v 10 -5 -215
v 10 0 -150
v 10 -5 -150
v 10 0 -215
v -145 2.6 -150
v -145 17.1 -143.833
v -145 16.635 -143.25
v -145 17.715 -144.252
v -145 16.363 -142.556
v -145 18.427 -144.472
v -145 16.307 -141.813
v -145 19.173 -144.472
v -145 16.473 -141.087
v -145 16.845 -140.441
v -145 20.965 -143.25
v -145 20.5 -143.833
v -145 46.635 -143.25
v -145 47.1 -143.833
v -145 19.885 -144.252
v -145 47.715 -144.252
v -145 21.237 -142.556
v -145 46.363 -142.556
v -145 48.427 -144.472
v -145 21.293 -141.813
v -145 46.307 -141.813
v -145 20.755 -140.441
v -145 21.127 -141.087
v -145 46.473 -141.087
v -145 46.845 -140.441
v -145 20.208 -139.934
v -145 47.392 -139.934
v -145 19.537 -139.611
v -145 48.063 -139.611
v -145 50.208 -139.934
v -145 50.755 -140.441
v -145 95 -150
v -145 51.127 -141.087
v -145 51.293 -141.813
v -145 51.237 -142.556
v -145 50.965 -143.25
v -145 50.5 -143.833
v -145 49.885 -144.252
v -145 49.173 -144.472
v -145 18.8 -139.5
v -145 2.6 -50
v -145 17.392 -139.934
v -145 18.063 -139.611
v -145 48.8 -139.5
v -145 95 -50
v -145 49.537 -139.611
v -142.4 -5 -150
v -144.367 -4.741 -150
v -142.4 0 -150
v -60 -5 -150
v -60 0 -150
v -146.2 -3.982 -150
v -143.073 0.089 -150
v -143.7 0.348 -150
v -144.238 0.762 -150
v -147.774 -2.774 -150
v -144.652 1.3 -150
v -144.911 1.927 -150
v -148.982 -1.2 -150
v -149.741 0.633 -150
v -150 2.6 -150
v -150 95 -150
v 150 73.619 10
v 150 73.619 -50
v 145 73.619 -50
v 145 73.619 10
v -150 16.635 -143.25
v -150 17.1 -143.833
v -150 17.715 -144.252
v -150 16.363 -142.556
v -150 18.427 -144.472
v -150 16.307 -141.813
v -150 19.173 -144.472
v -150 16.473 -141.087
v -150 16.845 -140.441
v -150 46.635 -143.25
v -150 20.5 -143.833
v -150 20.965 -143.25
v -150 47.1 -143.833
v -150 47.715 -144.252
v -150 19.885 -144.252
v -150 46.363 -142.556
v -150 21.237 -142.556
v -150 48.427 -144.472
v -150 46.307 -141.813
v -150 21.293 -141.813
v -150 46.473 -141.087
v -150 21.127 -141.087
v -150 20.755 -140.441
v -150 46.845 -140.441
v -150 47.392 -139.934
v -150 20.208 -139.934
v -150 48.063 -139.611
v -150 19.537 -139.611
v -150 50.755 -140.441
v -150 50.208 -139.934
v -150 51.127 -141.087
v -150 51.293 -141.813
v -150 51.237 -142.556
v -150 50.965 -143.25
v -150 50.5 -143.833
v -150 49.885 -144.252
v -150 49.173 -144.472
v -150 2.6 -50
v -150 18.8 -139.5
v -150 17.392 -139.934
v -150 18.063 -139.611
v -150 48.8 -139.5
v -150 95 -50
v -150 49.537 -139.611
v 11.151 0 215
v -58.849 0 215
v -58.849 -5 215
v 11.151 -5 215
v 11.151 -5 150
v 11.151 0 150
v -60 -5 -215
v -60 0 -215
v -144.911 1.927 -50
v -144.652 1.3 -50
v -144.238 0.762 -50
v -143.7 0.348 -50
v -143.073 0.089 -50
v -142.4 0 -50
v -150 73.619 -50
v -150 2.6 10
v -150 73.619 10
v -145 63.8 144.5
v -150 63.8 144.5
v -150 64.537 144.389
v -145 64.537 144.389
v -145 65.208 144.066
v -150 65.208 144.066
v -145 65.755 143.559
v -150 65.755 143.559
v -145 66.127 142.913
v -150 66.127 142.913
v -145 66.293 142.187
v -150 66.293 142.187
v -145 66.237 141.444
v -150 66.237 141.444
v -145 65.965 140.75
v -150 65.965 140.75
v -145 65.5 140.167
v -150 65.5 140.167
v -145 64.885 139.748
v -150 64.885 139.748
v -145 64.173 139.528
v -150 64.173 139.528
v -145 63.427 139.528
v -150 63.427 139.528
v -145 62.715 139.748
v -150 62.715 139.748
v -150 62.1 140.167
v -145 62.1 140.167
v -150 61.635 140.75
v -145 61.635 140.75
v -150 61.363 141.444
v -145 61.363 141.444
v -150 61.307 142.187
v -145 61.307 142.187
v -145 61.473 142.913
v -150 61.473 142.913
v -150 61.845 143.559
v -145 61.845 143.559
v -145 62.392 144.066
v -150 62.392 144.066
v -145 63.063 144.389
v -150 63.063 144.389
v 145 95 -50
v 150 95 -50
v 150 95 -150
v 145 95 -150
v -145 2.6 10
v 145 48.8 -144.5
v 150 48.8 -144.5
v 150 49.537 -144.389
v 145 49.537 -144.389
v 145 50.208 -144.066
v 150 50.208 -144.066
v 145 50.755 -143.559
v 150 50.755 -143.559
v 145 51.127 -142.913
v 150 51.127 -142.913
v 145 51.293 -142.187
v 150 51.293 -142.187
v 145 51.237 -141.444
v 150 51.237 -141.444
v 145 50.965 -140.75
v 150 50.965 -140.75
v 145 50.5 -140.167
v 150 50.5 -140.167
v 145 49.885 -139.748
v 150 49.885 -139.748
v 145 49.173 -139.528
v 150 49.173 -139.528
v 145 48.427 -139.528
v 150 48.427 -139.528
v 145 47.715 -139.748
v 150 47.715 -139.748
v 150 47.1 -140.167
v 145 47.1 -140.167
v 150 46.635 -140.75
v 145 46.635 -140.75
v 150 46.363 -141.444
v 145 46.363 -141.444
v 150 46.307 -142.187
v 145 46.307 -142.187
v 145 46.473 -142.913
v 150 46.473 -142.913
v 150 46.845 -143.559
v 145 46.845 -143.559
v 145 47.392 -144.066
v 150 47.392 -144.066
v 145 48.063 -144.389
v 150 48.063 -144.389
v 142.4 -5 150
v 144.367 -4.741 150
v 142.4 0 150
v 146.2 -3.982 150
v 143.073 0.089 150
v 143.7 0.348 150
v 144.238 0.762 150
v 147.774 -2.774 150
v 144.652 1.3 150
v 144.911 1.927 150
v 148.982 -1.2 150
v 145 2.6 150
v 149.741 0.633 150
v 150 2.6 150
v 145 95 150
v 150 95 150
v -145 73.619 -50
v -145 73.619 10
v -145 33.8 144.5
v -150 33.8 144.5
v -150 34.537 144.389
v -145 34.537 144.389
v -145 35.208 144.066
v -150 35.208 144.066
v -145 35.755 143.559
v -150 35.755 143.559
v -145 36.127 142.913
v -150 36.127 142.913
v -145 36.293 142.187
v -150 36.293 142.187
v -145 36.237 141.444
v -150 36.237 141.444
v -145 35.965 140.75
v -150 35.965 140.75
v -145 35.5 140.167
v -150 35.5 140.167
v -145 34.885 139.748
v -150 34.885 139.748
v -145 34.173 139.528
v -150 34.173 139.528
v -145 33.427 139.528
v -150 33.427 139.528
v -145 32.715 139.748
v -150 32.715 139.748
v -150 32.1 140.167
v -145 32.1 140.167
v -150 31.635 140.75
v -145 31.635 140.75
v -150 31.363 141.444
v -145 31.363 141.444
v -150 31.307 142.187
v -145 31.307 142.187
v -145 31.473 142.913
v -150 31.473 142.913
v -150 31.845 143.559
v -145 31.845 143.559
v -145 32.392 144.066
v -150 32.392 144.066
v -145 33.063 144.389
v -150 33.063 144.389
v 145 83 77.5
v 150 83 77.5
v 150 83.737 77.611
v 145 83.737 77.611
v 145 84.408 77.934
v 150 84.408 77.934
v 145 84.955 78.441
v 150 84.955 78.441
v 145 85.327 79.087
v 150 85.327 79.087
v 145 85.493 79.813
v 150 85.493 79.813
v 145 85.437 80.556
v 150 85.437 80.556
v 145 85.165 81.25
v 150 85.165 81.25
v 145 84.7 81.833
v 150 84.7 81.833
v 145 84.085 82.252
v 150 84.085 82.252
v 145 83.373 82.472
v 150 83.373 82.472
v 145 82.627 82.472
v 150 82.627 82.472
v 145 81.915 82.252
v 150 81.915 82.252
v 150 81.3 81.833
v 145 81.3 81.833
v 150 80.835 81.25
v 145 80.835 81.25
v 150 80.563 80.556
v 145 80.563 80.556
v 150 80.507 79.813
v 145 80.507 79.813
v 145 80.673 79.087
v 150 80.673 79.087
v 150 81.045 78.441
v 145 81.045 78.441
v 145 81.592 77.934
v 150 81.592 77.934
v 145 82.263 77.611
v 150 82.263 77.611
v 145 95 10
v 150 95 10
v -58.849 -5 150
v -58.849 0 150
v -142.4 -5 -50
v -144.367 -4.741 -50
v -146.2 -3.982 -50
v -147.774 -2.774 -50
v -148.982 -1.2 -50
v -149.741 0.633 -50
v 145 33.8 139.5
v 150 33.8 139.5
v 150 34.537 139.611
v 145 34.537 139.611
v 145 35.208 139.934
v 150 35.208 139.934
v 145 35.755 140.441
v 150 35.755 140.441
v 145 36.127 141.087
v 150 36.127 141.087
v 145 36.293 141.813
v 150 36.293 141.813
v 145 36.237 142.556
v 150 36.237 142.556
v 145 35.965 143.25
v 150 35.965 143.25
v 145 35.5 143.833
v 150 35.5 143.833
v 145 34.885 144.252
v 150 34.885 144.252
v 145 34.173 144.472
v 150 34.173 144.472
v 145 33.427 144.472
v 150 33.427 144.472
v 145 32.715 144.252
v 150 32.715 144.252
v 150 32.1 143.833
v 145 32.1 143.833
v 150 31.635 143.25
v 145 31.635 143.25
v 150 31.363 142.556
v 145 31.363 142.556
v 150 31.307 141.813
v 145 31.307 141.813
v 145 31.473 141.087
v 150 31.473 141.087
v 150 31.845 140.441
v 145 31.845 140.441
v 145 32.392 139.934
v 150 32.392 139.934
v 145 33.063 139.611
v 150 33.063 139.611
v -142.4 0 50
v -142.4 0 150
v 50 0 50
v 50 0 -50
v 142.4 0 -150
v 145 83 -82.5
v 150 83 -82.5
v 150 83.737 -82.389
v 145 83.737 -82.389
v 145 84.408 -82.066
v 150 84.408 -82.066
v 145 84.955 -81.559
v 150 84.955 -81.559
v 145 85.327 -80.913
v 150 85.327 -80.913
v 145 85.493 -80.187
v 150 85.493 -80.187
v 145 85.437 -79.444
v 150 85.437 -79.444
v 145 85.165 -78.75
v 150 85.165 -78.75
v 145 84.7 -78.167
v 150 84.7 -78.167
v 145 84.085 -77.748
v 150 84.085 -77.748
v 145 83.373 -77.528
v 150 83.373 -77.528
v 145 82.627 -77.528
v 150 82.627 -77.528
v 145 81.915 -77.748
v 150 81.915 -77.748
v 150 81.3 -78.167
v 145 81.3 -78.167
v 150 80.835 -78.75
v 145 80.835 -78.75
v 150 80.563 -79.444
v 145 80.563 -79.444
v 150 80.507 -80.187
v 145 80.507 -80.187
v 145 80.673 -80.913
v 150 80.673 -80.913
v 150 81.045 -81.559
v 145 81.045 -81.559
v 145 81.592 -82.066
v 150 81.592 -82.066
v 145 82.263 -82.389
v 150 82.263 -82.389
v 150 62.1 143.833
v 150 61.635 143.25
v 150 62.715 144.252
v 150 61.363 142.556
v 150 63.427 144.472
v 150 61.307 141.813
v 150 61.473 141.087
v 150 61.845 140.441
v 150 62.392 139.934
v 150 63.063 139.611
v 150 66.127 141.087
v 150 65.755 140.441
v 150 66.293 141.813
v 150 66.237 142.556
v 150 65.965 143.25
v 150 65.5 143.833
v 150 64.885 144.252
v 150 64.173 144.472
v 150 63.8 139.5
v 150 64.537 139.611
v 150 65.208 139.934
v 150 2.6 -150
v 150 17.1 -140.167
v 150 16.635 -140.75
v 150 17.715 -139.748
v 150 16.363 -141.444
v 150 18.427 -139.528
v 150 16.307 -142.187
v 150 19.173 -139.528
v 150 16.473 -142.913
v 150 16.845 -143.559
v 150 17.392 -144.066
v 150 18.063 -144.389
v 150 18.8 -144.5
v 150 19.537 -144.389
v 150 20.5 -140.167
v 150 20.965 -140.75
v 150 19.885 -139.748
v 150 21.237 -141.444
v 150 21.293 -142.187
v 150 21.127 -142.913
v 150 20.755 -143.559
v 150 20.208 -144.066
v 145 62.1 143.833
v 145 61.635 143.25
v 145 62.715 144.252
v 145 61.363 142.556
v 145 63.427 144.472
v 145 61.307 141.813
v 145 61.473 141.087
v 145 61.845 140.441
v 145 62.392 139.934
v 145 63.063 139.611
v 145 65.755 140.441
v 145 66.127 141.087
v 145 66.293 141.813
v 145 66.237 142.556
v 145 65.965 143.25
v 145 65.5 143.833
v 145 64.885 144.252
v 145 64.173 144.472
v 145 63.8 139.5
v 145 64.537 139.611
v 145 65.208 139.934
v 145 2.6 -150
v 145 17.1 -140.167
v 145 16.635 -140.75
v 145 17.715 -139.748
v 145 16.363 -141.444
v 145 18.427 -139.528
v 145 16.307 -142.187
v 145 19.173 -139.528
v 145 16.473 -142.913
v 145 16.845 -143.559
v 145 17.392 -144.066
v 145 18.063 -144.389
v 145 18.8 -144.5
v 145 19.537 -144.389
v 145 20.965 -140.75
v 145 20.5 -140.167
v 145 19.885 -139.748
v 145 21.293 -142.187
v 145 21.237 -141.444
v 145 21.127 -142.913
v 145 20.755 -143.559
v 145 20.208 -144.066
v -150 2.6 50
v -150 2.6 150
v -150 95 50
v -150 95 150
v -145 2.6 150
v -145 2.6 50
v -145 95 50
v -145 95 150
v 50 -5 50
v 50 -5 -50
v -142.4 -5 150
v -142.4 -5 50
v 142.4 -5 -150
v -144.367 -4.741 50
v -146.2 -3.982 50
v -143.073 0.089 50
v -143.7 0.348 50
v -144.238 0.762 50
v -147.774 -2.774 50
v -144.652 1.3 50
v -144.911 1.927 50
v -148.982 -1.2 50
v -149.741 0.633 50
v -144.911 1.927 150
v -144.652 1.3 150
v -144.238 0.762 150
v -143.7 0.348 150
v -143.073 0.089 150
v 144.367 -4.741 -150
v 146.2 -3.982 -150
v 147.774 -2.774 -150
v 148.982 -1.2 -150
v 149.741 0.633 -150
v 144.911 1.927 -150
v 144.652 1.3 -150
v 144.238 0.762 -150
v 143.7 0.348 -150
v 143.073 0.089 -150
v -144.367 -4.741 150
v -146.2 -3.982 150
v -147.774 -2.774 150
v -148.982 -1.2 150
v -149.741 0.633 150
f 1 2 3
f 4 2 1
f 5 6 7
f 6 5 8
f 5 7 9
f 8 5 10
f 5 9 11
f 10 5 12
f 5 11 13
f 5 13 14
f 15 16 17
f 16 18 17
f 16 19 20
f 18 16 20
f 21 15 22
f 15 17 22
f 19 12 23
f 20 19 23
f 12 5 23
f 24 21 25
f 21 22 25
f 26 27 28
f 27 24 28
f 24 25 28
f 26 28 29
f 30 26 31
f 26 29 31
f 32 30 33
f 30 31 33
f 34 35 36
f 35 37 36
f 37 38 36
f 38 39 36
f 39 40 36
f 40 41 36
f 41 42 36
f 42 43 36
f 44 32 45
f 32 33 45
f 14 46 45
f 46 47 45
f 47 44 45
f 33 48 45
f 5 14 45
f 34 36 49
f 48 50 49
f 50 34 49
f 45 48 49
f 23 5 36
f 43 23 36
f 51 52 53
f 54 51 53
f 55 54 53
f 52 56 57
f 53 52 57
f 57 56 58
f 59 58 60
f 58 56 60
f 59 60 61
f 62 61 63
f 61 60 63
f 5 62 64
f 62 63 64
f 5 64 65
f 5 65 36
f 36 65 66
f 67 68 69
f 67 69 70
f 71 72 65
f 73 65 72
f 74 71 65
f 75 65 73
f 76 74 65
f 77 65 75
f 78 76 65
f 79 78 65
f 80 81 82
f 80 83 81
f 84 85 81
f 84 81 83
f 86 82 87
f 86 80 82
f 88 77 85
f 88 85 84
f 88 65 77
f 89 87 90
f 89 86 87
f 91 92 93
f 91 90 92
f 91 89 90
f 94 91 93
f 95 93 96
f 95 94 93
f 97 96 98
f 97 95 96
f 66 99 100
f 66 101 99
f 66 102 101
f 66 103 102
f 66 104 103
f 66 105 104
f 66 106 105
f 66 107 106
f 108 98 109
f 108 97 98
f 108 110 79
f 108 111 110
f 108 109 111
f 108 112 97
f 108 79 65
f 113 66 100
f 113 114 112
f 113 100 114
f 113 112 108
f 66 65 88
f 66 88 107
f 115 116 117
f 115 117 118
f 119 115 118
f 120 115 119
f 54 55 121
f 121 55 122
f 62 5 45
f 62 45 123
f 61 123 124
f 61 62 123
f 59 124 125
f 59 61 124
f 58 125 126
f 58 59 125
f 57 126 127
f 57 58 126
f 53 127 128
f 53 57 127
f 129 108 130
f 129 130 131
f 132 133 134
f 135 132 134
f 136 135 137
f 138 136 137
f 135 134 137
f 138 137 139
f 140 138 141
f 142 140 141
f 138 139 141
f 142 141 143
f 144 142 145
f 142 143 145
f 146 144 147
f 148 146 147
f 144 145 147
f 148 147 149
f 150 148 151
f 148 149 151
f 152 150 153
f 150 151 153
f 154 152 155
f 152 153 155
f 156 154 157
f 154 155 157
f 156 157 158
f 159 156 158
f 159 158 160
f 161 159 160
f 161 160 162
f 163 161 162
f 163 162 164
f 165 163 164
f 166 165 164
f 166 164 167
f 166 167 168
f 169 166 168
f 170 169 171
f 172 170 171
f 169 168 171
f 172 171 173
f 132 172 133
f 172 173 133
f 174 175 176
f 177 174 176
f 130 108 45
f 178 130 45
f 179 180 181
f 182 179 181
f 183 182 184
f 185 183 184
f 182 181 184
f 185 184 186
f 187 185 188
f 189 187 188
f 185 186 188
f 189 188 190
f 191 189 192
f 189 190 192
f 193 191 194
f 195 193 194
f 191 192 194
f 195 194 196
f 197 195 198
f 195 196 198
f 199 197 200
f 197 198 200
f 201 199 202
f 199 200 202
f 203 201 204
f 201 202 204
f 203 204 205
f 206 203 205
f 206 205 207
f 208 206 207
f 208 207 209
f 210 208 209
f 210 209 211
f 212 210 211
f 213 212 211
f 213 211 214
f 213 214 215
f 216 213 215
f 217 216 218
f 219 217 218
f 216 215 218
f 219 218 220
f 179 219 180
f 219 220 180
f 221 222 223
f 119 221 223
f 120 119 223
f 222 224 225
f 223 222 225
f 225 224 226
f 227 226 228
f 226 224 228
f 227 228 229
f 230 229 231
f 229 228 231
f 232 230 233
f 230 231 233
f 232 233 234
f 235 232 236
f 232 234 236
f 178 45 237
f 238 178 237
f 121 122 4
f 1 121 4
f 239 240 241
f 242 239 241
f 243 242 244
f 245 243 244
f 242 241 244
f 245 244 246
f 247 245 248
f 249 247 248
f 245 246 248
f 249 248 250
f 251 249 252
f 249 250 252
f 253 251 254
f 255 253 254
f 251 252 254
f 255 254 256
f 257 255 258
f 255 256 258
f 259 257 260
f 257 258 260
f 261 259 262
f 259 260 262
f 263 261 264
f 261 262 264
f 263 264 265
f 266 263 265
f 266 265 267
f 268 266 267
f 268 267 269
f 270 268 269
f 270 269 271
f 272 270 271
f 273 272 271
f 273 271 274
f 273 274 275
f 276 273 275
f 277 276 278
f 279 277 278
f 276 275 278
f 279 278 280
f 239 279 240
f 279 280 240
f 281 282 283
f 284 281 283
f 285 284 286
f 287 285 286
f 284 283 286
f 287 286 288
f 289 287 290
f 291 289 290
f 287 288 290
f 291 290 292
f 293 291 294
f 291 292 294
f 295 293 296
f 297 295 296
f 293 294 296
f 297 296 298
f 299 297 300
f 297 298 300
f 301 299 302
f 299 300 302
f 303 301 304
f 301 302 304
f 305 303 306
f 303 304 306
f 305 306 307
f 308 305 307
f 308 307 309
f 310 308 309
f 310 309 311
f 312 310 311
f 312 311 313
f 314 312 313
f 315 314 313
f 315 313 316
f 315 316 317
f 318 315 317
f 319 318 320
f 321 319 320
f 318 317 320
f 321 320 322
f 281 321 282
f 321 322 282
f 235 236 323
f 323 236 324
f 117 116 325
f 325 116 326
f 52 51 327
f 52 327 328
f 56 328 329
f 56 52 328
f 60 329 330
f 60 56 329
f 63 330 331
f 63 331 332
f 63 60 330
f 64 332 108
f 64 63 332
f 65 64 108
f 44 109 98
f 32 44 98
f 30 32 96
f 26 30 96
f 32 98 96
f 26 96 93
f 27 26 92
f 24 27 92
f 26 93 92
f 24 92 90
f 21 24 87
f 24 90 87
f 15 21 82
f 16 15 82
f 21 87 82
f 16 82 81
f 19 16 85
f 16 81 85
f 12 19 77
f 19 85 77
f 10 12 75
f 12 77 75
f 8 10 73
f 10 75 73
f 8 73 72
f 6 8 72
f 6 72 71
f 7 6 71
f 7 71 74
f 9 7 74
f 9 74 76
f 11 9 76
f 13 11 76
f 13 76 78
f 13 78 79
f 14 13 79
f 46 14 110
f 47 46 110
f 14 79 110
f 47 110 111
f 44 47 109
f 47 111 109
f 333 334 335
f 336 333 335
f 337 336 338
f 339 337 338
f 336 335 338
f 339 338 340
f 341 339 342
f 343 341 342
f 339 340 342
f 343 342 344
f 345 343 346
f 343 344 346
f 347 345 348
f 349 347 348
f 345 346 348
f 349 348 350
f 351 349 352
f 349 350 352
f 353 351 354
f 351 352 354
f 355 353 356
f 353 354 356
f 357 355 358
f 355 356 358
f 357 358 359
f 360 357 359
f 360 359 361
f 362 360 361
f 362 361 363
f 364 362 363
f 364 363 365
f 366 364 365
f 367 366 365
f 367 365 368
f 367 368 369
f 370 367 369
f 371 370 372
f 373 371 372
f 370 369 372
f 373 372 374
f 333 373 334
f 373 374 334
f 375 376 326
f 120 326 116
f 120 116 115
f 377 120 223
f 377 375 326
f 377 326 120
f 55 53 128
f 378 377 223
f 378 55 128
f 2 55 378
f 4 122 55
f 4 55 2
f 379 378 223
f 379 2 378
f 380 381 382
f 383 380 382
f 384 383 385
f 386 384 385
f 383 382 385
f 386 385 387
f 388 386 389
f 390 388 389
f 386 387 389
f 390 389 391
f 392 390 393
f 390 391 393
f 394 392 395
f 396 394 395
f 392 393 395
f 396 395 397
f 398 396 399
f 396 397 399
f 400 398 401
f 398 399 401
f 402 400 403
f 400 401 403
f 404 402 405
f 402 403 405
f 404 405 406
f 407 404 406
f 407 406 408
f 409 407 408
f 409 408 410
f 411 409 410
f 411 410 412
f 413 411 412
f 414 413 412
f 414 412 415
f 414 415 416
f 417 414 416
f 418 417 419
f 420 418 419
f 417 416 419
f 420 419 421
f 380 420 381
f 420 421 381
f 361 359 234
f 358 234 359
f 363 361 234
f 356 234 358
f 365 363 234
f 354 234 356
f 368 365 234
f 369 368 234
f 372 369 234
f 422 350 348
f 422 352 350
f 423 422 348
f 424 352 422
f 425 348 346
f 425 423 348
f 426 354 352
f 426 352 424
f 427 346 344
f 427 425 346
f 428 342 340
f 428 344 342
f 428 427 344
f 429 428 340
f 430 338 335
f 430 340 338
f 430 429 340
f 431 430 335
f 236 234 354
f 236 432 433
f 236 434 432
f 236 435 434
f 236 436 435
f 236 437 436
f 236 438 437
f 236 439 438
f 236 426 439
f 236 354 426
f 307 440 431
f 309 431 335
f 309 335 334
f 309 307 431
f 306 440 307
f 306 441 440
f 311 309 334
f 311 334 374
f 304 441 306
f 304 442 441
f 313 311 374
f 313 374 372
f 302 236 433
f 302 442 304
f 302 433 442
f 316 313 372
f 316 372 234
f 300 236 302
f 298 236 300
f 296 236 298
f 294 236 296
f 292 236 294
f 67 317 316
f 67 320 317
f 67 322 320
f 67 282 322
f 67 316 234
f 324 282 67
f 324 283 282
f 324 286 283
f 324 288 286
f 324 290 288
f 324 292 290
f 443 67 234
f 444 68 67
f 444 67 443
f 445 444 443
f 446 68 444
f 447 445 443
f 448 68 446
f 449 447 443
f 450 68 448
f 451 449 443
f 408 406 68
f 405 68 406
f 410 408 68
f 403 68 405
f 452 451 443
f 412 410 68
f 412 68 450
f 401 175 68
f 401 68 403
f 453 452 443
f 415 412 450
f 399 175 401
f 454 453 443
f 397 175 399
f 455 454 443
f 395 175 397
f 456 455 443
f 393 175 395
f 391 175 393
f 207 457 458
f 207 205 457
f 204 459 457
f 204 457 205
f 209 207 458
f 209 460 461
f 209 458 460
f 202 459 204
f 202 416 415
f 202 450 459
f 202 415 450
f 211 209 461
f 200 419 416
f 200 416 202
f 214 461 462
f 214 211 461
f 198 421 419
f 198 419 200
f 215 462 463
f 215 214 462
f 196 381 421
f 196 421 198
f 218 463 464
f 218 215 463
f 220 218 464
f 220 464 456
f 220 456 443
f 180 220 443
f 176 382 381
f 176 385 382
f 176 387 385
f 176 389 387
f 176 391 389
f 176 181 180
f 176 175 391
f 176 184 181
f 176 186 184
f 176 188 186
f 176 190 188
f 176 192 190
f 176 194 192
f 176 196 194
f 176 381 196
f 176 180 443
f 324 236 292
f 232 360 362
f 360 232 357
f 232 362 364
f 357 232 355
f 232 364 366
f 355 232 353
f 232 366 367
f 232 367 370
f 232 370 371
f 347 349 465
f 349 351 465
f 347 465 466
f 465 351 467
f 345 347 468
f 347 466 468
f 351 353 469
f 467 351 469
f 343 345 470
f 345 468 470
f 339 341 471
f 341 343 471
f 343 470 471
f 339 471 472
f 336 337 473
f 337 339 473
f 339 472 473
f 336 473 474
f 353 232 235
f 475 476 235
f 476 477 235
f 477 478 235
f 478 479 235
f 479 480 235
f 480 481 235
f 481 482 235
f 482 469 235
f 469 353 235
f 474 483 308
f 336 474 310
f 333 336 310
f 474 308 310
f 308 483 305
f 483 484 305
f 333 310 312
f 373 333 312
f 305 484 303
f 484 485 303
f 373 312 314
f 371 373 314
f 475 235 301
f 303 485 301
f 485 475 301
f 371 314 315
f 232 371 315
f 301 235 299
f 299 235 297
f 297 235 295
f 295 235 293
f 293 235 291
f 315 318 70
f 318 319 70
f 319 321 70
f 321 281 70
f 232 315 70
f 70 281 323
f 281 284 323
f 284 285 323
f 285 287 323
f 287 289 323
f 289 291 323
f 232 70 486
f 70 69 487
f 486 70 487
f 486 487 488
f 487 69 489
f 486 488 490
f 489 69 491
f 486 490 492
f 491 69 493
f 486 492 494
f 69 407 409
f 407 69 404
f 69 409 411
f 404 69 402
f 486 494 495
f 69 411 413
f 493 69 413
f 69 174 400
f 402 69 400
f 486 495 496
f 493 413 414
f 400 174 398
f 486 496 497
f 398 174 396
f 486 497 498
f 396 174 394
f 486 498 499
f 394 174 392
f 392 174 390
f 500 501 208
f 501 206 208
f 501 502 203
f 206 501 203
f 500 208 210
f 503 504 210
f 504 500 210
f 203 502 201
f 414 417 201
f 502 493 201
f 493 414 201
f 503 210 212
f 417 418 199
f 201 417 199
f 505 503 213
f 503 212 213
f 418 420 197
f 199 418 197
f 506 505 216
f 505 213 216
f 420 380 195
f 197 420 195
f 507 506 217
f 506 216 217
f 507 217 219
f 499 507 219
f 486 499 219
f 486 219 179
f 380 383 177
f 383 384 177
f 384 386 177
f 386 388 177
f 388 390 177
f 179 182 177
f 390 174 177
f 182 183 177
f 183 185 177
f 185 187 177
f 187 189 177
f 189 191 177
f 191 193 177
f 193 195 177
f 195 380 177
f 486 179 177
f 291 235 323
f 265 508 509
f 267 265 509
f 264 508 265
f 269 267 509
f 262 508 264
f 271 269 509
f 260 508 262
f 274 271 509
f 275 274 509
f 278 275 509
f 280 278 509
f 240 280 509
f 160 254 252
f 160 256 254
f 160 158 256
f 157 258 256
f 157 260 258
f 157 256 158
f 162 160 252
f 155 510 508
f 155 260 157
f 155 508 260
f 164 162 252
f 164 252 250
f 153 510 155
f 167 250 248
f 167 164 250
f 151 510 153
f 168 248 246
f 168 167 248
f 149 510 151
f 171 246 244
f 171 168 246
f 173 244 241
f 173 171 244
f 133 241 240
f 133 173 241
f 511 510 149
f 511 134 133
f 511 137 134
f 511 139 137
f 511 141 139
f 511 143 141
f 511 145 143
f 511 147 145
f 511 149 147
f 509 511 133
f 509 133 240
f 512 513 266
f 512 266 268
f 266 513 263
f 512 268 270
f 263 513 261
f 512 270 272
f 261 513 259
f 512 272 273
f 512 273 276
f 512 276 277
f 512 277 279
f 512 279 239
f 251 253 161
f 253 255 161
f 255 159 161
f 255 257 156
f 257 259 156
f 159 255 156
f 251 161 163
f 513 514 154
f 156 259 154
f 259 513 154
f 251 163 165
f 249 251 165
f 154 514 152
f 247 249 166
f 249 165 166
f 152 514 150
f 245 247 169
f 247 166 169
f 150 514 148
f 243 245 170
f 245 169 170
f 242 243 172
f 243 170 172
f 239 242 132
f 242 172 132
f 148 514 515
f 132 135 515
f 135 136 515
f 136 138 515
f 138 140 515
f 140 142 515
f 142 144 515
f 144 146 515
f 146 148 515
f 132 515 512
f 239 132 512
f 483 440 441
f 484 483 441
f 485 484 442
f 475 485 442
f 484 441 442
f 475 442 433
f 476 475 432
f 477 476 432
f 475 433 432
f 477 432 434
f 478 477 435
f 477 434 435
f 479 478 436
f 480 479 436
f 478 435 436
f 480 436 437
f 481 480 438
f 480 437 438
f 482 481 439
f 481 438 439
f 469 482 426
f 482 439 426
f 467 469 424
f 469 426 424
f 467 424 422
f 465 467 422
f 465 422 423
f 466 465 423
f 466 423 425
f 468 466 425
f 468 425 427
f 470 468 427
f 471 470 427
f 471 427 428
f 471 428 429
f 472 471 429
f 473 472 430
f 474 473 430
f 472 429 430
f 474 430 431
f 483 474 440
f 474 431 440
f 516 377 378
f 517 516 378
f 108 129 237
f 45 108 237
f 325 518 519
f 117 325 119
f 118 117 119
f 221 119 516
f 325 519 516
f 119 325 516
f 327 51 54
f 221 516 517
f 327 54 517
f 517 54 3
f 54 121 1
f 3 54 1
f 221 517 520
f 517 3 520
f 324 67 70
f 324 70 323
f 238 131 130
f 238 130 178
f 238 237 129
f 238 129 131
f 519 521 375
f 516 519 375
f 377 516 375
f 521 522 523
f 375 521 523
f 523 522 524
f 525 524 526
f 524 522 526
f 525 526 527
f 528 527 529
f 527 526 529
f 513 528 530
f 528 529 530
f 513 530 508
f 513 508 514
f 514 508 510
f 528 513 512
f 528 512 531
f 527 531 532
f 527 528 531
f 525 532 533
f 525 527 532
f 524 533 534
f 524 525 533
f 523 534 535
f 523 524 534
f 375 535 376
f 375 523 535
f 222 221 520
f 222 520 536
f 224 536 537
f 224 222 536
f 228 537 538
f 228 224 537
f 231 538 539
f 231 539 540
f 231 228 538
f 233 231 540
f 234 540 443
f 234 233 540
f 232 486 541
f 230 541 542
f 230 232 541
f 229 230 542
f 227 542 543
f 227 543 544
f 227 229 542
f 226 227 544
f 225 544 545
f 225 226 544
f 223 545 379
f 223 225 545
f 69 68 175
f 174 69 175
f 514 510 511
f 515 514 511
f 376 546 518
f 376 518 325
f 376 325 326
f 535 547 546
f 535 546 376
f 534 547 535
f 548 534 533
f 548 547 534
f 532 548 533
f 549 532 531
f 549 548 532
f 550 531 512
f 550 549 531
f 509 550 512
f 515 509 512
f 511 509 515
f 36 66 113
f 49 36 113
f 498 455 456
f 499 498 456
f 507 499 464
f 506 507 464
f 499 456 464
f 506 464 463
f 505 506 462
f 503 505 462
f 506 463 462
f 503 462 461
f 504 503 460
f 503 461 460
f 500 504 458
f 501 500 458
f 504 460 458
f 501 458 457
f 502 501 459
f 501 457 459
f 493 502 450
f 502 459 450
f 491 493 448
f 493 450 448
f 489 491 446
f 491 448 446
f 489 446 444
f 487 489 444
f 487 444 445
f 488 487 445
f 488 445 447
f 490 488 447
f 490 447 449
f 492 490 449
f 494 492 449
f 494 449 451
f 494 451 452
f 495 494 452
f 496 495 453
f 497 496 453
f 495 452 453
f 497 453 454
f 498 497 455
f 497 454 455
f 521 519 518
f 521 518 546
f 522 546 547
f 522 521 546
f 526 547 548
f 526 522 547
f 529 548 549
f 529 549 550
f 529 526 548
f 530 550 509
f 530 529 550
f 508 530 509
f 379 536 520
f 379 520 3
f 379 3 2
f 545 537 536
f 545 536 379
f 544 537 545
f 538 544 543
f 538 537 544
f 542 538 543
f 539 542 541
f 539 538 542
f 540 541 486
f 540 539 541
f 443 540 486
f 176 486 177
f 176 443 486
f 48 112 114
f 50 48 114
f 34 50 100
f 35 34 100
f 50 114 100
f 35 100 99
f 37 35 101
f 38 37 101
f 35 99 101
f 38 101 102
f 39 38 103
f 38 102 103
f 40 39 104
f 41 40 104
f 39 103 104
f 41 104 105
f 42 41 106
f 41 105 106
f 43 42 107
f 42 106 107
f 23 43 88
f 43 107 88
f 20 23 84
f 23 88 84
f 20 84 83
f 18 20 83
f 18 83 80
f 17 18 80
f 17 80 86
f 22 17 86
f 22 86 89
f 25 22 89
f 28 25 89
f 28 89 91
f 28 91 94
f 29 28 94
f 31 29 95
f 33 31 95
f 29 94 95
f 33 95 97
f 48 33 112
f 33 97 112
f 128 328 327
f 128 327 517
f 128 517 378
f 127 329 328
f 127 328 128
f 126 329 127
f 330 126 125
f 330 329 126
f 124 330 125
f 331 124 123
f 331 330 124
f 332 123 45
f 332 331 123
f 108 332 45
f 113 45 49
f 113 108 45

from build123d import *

# Parameters (mm, degrees)
SKETCH1_W                    = 300
SKETCH1_H                    = 300
BASE_FLANGE1_DEPTH           = 5
EDGE_FLANGE1_STRIP_W         = 25.2
EDGE_FLANGE1_STRIP_H         = 5
EDGE_FLANGE1_STRIP_CUT_DEPTH = 300
EDGE_FLANGE1_DEPTH           = 300
EDGE_FLANGE1_PROFILE_W       = 300
EDGE_FLANGE1_PROFILE_H       = 92.4
EDGE_FLANGE1_PROFILE_R       = 2.5
EDGE_FLANGE1_FLAT_DEPTH      = 5
SKETCH9_W                    = 200
SKETCH9_H                    = 100
CUT_EXTRUDE1_DEPTH           = 10
SKETCH16_W                   = 70
SKETCH16_H                   = 65
TAB2_DEPTH                   = 5
EDGE_FLANGE3_STRIP_W         = 25.2
EDGE_FLANGE3_STRIP_H         = 5
EDGE_FLANGE3_STRIP_CUT_DEPTH = 100
EDGE_FLANGE3_DEPTH           = 100
EDGE_FLANGE3_PROFILE_W       = 100
EDGE_FLANGE3_PROFILE_H       = 92.4
EDGE_FLANGE3_PROFILE_R       = 2.5
EDGE_FLANGE3_FLAT_DEPTH      = 5
EDGE_FLANGE4_STRIP_W         = 25.2
EDGE_FLANGE4_STRIP_H         = 5
EDGE_FLANGE4_STRIP_CUT_DEPTH = 100
EDGE_FLANGE4_DEPTH           = 100
EDGE_FLANGE4_PROFILE_W       = 100
EDGE_FLANGE4_PROFILE_H       = 92.4
EDGE_FLANGE4_PROFILE_R       = 2.5
EDGE_FLANGE4_FLAT_DEPTH      = 5
SKETCH37_W                   = 5
SKETCH37_H                   = 92.4
BASE_FLANGE2_DEPTH           = 60
CUT_EXTRUDE2_DEPTH           = 5
CUT_EXTRUDE3_START           = -300
SKETCH41_W                   = 60
SKETCH41_H                   = 21.380618099
CUT_EXTRUDE3_DEPTH           = 300


# Sheet-metal steps are written as plain solids
with BuildPart() as part:
    # Sketch1 → Base-Flange1 (new body)
    with BuildSketch(Plane(origin=(0, 0, 0), x_dir=(1, 0, 0), z_dir=(0, 1, 0))):
        Rectangle(SKETCH1_W, SKETCH1_H)
    extrude(amount=-BASE_FLANGE1_DEPTH)

    # Edge-Flange1 strip (across the edge) → Edge-Flange1 strip cut (cut)
    with BuildSketch(Plane(origin=(150, 0, 150), x_dir=(-1, 0, 0), z_dir=(0, 0, -1))):
        with Locations((-5, -2.5)):
            Rectangle(EDGE_FLANGE1_STRIP_W, EDGE_FLANGE1_STRIP_H)
    extrude(amount=EDGE_FLANGE1_STRIP_CUT_DEPTH, mode=Mode.SUBTRACT)

    # Edge-Flange1 bend section (across the edge) → Edge-Flange1 (add)
    with BuildSketch(Plane(origin=(150, 0, 150), x_dir=(-1, 0, 0), z_dir=(0, 0, -1))):
        with BuildLine():
            Line((0, 2.6), (5, 2.6))
            ThreePointArc((5, 2.6), (5.761522369, 0.761522369), (7.6, 0))
            Line((7.6, 0), (7.6, -5))
            ThreePointArc((7.6, -5), (2.225988463, -2.774011537), (0, 2.6))
        make_face()
    extrude(amount=EDGE_FLANGE1_DEPTH)

    # Edge-Flange1 profile (on flange) → Edge-Flange1 flat (add)
    with BuildSketch(Plane(origin=(150, 0, 0), x_dir=(0, 0, -1), z_dir=(1, 0, 0))):
        with Locations((0, 48.8)):
            Rectangle(EDGE_FLANGE1_PROFILE_W, EDGE_FLANGE1_PROFILE_H)
        with Locations((-142, 33.8)):
            Circle(EDGE_FLANGE1_PROFILE_R, mode=Mode.SUBTRACT)
        with Locations((142, 18.8)):
            Circle(EDGE_FLANGE1_PROFILE_R, mode=Mode.SUBTRACT)
        with Locations((142, 48.8)):
            Circle(EDGE_FLANGE1_PROFILE_R, mode=Mode.SUBTRACT)
        with Locations((-142, 63.8)):
            Circle(EDGE_FLANGE1_PROFILE_R, mode=Mode.SUBTRACT)
        with Locations((-80, 83)):
            Circle(EDGE_FLANGE1_PROFILE_R, mode=Mode.SUBTRACT)
        with Locations((80, 83)):
            Circle(EDGE_FLANGE1_PROFILE_R, mode=Mode.SUBTRACT)
    extrude(amount=-EDGE_FLANGE1_FLAT_DEPTH)

    # Sketch9 → Cut-Extrude1 (cut)
    with BuildSketch(Plane(origin=(0, 0, 0), x_dir=(1, 0, 0), z_dir=(0, 1, 0))):
        with Locations((-50, 0)):
            Rectangle(SKETCH9_W, SKETCH9_H)
    extrude(amount=-CUT_EXTRUDE1_DEPTH, mode=Mode.SUBTRACT)

    # Sketch16 → Tab2 (add)
    with BuildSketch(Plane(origin=(0, 0, 0), x_dir=(1, 0, 0), z_dir=(0, 1, 0))):
        with Locations((-25, 182.5)):
            Rectangle(SKETCH16_W, SKETCH16_H)
        with Locations((-23.848827091, -182.5)):
            Rectangle(SKETCH16_W, SKETCH16_H)
    extrude(amount=-TAB2_DEPTH)

    # Edge-Flange3 strip (across the edge) → Edge-Flange3 strip cut (cut)
    with BuildSketch(Plane(origin=(-150, 0, 50), x_dir=(1, 0, 0), z_dir=(0, 0, 1))):
        with Locations((-5, -2.5)):
            Rectangle(EDGE_FLANGE3_STRIP_W, EDGE_FLANGE3_STRIP_H)
    extrude(amount=EDGE_FLANGE3_STRIP_CUT_DEPTH, mode=Mode.SUBTRACT)

    # Edge-Flange3 bend section (across the edge) → Edge-Flange3 (add)
    with BuildSketch(Plane(origin=(-150, 0, 50), x_dir=(1, 0, 0), z_dir=(0, 0, 1))):
        with BuildLine():
            Line((0, 2.6), (5, 2.6))
            ThreePointArc((5, 2.6), (5.761522369, 0.761522369), (7.6, 0))
            Line((7.6, 0), (7.6, -5))
            ThreePointArc((7.6, -5), (2.225988463, -2.774011537), (0, 2.6))
        make_face()
    extrude(amount=EDGE_FLANGE3_DEPTH)

    # Edge-Flange3 profile (on flange) → Edge-Flange3 flat (add)
    with BuildSketch(Plane.ZY.offset(150)):
        with Locations((100, 48.8)):
            Rectangle(EDGE_FLANGE3_PROFILE_W, EDGE_FLANGE3_PROFILE_H)
        with Locations((142, 33.8)):
            Circle(EDGE_FLANGE3_PROFILE_R, mode=Mode.SUBTRACT)
        with Locations((142, 63.8)):
            Circle(EDGE_FLANGE3_PROFILE_R, mode=Mode.SUBTRACT)
    extrude(amount=-EDGE_FLANGE3_FLAT_DEPTH)

    # Edge-Flange4 strip (across the edge) → Edge-Flange4 strip cut (cut)
    with BuildSketch(Plane(origin=(-150, 0, -150), x_dir=(1, 0, 0), z_dir=(0, 0, 1))):
        with Locations((-5, -2.5)):
            Rectangle(EDGE_FLANGE4_STRIP_W, EDGE_FLANGE4_STRIP_H)
    extrude(amount=EDGE_FLANGE4_STRIP_CUT_DEPTH, mode=Mode.SUBTRACT)

    # Edge-Flange4 bend section (across the edge) → Edge-Flange4 (add)
    with BuildSketch(Plane(origin=(-150, 0, -150), x_dir=(1, 0, 0), z_dir=(0, 0, 1))):
        with BuildLine():
            Line((0, 2.6), (5, 2.6))
            ThreePointArc((5, 2.6), (5.761522369, 0.761522369), (7.6, 0))
            Line((7.6, 0), (7.6, -5))
            ThreePointArc((7.6, -5), (2.225988463, -2.774011537), (0, 2.6))
        make_face()
    extrude(amount=EDGE_FLANGE4_DEPTH)

    # Edge-Flange4 profile (on flange) → Edge-Flange4 flat (add)
    with BuildSketch(Plane.ZY.offset(150)):
        with Locations((-100, 48.8)):
            Rectangle(EDGE_FLANGE4_PROFILE_W, EDGE_FLANGE4_PROFILE_H)
        with Locations((-142, 18.8)):
            Circle(EDGE_FLANGE4_PROFILE_R, mode=Mode.SUBTRACT)
        with Locations((-142, 48.8)):
            Circle(EDGE_FLANGE4_PROFILE_R, mode=Mode.SUBTRACT)
    extrude(amount=-EDGE_FLANGE4_FLAT_DEPTH)


with BuildPart() as body_2:
    # Sketch37 → Base-Flange2 (new body)
    with BuildSketch(Plane.XY.offset(-50)):
        with Locations((-147.5, 48.8)):
            Rectangle(SKETCH37_W, SKETCH37_H)
    extrude(amount=BASE_FLANGE2_DEPTH)

    # Sketch40 → Cut-Extrude2 (cut)
    with BuildSketch(Plane.ZY.offset(150)):
        with BuildLine():
            Line((-20, 95), (0, 95))
            ThreePointArc((0, 95), (-10, 85), (-20, 95))
        make_face()
    extrude(amount=-CUT_EXTRUDE2_DEPTH, mode=Mode.SUBTRACT)


with BuildPart() as cut_extrude3_tool:
    # Sketch41 → Cut-Extrude3 (new body)
    with BuildSketch(Plane.ZY.offset(150).offset(CUT_EXTRUDE3_START)):
        with Locations((-20, 84.30969095)):
            Rectangle(SKETCH41_W, SKETCH41_H)
    extrude(amount=CUT_EXTRUDE3_DEPTH)


with BuildPart() as part_1:
    add(part.part)

    # Cut-Extrude3: cut by cut_extrude3_tool
    add(cut_extrude3_tool.part, mode=Mode.SUBTRACT)


with BuildPart() as body_2_1:
    add(body_2.part)

    # Cut-Extrude3: cut by cut_extrude3_tool
    add(cut_extrude3_tool.part, mode=Mode.SUBTRACT)


solid = Compound([part_1.part, body_2_1.part])
